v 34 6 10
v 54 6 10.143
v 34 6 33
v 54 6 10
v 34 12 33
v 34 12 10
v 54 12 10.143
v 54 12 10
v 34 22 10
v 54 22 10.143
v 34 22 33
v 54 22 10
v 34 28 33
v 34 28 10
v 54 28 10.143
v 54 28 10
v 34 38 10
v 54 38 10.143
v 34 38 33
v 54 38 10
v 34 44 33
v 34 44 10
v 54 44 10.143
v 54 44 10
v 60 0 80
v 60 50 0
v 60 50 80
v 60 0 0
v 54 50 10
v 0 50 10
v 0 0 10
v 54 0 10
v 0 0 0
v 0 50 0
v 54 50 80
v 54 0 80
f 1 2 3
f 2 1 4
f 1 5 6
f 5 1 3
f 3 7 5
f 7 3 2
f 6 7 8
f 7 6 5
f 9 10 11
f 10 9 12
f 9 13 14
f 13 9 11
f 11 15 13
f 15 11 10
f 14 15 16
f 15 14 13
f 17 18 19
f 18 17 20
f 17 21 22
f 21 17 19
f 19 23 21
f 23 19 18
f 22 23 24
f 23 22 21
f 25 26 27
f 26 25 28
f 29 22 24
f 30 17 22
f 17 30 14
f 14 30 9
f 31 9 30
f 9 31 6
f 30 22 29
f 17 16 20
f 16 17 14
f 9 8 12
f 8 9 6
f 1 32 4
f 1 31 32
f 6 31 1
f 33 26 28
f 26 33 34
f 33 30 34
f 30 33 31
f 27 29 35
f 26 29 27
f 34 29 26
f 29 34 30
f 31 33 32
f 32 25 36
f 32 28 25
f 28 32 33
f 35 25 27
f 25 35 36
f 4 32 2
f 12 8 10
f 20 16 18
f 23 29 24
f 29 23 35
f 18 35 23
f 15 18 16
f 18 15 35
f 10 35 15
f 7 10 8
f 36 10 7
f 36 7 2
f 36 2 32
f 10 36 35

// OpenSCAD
$fn = 32;

// ----------------------------------------------------------------------
// Rib bracket: 3-gusset L bracket
// ----------------------------------------------------------------------

// --- parameters (mm) ---
base_l = 60;              // foot length, X
base_w = 50;              // foot width, Y
base_t = 10;              // foot thickness
plate_t = 6;              // upright plate thickness
plate_h = 80;             // overall height
gus_l = 20;               // gusset leg along the foot
gus_h = 24;               // gusset height
gus_t = 6;                // gusset thickness
gus_edge = 6;             // gusset margin from the foot edge
n_gus = 3;                // gusset count

gus_pitch = (base_w - 2 * gus_edge - gus_t) / (n_gus - 1);  // gusset pitch

union() {
  cube([base_l, base_w, base_t]);
  translate([base_l - plate_t, 0, base_t - 1])
    cube([plate_t, base_w, plate_h - base_t + 1]);
  for (i = [0 : n_gus - 1])
    translate([base_l - plate_t - gus_l, gus_edge + i * gus_pitch, base_t - 1])
      rotate([-90, 0, 0])
        linear_extrude(height = gus_t)
          polygon(points = [[0, 0], [gus_l + 1, 0], [0, -gus_h]]);
}
